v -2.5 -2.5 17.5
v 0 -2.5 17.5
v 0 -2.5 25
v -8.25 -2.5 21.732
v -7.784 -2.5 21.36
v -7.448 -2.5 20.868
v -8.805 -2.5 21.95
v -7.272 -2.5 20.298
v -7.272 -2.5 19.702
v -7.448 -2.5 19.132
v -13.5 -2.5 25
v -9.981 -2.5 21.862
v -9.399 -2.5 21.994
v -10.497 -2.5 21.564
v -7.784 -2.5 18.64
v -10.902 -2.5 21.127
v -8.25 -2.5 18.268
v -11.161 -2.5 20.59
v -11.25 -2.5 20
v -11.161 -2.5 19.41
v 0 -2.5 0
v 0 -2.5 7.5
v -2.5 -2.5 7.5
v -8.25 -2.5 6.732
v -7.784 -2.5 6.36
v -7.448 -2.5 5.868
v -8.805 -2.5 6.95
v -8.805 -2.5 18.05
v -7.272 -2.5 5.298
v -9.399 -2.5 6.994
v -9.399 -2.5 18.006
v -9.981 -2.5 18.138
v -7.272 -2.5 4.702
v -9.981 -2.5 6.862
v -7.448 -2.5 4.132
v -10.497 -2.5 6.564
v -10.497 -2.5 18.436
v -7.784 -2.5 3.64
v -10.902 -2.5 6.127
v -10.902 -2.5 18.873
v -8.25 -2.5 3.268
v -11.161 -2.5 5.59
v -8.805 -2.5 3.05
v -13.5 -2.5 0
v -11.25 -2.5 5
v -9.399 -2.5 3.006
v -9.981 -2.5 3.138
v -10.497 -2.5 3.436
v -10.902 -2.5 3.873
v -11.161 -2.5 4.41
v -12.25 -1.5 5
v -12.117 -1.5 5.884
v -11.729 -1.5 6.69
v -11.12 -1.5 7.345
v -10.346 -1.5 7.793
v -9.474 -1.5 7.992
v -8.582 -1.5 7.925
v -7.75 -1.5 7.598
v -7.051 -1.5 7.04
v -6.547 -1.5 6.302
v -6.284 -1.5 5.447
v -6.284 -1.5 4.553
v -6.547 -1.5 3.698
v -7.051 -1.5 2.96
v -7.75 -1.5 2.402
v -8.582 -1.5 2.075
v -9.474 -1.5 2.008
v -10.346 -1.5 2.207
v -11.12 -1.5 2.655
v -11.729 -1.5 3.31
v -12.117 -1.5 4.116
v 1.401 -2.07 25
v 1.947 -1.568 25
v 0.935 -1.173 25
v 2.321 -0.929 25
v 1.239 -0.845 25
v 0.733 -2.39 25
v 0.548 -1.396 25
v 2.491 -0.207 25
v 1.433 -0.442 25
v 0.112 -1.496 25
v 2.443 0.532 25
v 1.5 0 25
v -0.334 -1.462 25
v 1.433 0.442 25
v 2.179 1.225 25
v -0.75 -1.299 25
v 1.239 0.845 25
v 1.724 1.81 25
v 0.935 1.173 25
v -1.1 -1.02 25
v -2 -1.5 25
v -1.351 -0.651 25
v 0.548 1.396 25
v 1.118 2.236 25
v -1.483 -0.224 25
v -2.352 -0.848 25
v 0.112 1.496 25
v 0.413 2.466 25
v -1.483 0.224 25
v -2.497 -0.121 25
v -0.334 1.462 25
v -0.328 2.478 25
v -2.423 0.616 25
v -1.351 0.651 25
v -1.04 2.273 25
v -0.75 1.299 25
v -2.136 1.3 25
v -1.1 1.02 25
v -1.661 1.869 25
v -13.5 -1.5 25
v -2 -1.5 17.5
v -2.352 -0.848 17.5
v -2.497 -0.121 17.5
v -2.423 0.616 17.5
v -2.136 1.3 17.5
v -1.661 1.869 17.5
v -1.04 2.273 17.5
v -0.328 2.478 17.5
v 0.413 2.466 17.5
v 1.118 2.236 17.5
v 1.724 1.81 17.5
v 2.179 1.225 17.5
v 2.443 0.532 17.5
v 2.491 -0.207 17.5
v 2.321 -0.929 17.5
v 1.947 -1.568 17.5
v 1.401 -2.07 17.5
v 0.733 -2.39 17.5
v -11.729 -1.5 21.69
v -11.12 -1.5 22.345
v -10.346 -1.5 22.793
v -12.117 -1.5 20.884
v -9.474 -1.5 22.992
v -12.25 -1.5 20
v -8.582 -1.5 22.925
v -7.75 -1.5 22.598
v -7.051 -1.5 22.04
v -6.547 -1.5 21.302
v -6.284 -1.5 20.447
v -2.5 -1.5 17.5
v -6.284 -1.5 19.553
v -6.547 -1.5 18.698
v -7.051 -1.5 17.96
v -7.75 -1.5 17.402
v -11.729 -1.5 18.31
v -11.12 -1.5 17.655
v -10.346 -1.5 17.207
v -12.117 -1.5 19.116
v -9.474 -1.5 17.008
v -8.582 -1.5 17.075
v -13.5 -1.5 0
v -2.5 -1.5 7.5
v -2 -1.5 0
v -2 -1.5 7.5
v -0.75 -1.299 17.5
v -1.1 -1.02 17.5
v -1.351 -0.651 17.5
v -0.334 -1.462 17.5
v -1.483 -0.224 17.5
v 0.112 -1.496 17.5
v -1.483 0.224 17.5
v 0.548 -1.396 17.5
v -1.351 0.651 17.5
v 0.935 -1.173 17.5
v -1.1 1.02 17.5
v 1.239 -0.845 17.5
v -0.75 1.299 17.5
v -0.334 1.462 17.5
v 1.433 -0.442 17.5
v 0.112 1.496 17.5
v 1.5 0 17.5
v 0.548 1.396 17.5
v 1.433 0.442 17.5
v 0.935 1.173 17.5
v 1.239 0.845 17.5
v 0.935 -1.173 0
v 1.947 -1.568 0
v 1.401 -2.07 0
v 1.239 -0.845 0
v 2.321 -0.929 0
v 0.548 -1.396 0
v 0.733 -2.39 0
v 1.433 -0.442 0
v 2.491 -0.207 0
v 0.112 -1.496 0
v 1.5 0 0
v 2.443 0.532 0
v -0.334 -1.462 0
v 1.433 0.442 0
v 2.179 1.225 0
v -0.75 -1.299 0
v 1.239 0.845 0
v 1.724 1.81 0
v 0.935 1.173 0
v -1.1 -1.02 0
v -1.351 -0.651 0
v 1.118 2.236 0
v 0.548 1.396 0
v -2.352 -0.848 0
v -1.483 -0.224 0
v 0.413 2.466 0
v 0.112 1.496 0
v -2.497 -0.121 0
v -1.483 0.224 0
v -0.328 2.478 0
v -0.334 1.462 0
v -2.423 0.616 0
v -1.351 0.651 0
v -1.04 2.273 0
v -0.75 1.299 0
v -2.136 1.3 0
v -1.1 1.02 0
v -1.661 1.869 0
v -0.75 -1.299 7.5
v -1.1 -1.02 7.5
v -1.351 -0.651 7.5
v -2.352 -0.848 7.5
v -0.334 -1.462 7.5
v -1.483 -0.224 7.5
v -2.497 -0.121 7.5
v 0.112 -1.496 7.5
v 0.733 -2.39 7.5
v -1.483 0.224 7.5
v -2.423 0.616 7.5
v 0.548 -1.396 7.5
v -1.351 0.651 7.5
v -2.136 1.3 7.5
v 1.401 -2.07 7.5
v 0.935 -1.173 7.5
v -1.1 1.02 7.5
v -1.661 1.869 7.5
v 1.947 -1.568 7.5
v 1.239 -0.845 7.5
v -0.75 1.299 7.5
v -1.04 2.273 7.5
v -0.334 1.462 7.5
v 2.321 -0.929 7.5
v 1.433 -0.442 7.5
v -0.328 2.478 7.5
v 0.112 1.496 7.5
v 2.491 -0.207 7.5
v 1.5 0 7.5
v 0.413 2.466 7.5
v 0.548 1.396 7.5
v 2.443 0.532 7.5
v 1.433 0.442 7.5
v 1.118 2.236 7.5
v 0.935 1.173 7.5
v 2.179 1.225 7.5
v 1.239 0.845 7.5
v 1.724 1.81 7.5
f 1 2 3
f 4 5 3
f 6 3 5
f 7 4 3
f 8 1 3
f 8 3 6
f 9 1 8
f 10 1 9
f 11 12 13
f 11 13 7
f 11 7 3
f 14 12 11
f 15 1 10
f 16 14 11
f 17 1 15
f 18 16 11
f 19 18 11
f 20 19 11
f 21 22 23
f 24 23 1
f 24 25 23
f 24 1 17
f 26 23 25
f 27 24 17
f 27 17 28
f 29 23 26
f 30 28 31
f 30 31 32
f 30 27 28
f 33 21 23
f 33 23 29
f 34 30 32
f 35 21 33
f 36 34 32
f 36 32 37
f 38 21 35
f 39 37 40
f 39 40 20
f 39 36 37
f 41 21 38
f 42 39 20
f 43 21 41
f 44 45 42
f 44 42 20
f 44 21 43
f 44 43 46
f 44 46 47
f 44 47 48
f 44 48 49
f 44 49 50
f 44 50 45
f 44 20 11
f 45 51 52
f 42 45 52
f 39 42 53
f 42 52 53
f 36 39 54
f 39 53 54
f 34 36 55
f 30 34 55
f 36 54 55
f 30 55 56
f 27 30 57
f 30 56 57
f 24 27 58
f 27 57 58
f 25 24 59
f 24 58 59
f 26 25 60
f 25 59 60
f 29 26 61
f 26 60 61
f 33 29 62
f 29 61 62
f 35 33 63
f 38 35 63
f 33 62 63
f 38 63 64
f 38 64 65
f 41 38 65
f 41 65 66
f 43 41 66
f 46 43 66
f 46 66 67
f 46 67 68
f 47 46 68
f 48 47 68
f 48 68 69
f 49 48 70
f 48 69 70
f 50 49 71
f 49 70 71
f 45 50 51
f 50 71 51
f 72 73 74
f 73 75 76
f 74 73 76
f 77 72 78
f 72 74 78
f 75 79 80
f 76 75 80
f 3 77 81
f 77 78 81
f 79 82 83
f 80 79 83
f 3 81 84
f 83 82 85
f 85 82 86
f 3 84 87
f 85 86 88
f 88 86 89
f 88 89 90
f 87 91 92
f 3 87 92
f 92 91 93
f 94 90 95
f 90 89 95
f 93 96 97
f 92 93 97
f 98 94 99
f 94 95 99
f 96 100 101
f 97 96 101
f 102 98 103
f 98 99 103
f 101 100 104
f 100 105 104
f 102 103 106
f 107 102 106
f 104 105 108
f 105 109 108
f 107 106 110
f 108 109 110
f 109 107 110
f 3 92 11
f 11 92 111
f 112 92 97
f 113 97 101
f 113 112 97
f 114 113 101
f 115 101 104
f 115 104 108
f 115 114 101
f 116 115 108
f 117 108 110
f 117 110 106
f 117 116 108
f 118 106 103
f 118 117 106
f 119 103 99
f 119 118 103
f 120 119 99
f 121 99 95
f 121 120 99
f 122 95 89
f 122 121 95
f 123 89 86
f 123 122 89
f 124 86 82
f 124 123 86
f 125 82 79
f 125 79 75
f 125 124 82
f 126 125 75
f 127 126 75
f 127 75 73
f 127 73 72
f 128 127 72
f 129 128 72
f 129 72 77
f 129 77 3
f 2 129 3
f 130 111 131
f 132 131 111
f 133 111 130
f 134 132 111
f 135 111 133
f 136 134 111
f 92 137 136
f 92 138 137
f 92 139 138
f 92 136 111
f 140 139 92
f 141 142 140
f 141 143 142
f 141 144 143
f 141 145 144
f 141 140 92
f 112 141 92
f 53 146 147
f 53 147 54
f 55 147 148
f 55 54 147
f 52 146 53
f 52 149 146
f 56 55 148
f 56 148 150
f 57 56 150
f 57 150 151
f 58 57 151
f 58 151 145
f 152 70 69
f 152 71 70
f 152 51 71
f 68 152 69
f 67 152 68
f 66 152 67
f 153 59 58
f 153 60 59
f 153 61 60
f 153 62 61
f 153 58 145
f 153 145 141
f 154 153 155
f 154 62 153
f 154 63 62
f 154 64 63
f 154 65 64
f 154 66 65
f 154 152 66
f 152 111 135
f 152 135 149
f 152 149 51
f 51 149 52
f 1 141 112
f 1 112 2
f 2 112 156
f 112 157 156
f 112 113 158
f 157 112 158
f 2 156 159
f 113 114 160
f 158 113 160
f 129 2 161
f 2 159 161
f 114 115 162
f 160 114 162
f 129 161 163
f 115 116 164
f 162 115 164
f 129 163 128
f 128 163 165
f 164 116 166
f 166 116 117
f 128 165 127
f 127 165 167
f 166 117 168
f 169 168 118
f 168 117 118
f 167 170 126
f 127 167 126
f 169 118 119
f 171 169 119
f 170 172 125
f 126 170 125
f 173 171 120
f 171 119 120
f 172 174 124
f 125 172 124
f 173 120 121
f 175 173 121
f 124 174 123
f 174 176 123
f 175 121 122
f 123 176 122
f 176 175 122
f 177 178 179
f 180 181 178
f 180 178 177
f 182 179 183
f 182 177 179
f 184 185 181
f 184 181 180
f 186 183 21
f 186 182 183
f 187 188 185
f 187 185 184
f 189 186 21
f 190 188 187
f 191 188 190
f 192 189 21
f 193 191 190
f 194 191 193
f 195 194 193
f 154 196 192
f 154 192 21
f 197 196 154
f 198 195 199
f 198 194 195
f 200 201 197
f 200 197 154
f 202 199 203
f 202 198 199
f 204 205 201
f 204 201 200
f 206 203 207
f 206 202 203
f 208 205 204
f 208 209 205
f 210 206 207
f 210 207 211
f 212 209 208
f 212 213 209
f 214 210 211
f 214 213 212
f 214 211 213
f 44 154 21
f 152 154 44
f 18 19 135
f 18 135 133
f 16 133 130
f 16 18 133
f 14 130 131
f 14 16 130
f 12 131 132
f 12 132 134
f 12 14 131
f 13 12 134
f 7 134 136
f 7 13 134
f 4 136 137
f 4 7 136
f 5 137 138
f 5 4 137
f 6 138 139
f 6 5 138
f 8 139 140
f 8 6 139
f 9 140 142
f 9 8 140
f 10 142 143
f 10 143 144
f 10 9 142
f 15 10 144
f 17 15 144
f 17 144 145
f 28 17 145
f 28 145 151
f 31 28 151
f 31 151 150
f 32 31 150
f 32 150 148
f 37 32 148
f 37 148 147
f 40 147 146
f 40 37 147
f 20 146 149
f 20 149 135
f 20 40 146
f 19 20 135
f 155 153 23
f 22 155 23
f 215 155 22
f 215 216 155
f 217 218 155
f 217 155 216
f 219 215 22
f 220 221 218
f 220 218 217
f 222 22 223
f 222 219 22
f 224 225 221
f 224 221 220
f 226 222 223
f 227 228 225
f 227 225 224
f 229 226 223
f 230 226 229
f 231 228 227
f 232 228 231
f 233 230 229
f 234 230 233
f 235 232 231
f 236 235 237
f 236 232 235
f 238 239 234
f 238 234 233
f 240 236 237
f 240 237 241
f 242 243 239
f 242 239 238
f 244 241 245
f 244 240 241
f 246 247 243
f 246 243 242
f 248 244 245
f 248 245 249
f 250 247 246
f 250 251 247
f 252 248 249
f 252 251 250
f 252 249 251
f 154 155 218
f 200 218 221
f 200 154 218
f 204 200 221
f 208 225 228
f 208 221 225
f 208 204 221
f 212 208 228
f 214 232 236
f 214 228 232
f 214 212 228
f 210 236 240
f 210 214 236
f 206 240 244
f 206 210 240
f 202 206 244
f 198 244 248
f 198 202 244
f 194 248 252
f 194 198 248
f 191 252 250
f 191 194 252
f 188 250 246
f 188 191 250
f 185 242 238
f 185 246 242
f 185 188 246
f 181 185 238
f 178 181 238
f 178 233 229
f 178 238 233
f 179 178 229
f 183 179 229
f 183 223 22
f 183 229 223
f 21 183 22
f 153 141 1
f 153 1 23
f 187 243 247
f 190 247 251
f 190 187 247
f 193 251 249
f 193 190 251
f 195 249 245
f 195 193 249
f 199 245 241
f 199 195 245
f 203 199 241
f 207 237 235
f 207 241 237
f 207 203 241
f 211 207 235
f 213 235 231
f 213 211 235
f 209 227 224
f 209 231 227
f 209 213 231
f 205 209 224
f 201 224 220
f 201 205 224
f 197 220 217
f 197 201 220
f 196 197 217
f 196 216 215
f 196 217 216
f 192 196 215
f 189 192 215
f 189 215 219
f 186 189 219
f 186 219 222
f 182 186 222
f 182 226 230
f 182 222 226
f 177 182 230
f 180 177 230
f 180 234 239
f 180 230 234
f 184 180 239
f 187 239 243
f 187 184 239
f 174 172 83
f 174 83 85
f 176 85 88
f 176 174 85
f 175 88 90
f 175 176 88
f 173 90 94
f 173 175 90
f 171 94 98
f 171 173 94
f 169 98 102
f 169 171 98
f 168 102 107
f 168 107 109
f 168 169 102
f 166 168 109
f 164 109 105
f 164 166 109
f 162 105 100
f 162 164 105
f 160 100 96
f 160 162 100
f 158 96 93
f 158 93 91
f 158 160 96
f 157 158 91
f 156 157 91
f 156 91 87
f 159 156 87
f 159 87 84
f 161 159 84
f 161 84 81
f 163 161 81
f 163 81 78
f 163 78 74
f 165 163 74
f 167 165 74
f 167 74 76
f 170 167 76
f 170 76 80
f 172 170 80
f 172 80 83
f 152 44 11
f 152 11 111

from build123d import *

# Parameters (mm, degrees)
SKETCH_1_R          = 1.5
EXTRUDE_1_DEPTH     = 25
SKETCH_2_R          = 2
SKETCH_2_W          = 5
SKETCH_2_H          = 10
CUT_EXTRUDE_1_DEPTH = 7.5
CHAMFER_1_SIZE      = 1


with BuildPart() as part:
    # 草图1 → 凸台-拉伸1 (new body)
    with BuildSketch(Plane.XY):
        with BuildLine():
            Line((0, -2.5), (-13.5, -2.5))
            Line((-13.5, -2.5), (-13.5, -1.5))
            Line((-13.5, -1.5), (-2, -1.5))
            ThreePointArc((-2, -1.5), (1.118033989, 2.236067977), (0, -2.5))
        make_face()
        Circle(SKETCH_1_R, mode=Mode.SUBTRACT)
    extrude(amount=EXTRUDE_1_DEPTH)

    # 草图2 → 切除-拉伸1 (cut, symmetric)
    with BuildSketch(Plane(origin=(0, -1.5, 0), x_dir=(1, 0, 0), z_dir=(0, 1, 0))):
        with Locations(Location((-9.25, -5, 0), (0, 0, 180))):
            Circle(SKETCH_2_R)
        with Locations(Location((-9.25, -20, 0), (0, 0, 180))):
            Circle(SKETCH_2_R)
        with Locations((0, -12.5)):
            Rectangle(SKETCH_2_W, SKETCH_2_H)
    extrude(amount=CUT_EXTRUDE_1_DEPTH, both=True, mode=Mode.SUBTRACT)

    # 倒角1
    chamfer_1_edges = [part.edges().sort_by_distance(p)[0] for p in [
        (-7.25, -1.5, 5),
        (-7.25, -1.5, 20),
    ]]
    chamfer(chamfer_1_edges, length=CHAMFER_1_SIZE - 0.0001)  # a hair under: the kernel refuses the full size


solid = part.part
